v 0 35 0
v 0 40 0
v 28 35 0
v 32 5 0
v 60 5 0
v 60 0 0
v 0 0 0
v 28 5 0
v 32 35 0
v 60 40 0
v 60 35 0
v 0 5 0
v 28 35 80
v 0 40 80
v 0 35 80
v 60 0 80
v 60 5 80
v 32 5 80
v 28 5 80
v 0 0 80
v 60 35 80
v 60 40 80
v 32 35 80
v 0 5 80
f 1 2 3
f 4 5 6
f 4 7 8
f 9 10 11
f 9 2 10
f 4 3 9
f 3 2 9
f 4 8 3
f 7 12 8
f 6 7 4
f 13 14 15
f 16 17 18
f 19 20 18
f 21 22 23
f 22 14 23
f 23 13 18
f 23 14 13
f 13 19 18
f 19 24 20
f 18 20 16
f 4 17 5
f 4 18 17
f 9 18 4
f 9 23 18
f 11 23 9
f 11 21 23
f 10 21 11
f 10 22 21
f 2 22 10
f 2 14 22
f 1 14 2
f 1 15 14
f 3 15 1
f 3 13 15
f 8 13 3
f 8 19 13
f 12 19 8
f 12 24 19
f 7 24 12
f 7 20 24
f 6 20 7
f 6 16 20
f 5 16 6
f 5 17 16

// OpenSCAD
$fn = 32;

// ----------------------------------------------------------------------
// Structural section: ibeam 60 x 40 mm
// ----------------------------------------------------------------------

// --- parameters (mm) ---
sec_w = 60;               // section width, X
sec_h = 40;               // section height, Y
flange_t = 5;             // flange thickness
web_t = 4;                // web thickness
plate_t = 80;             // cut length, Z (extrusion height)

profile = [[0, 0], [60, 0], [60, 5], [32, 5], [32, 35], [60, 35], [60, 40], [0, 40], [0, 35], [28, 35], [28, 5], [0, 5]];  // primary outline, 12 points, counter clockwise

// --- the one profile operation ---
linear_extrude(height = plate_t) polygon(points = profile);
